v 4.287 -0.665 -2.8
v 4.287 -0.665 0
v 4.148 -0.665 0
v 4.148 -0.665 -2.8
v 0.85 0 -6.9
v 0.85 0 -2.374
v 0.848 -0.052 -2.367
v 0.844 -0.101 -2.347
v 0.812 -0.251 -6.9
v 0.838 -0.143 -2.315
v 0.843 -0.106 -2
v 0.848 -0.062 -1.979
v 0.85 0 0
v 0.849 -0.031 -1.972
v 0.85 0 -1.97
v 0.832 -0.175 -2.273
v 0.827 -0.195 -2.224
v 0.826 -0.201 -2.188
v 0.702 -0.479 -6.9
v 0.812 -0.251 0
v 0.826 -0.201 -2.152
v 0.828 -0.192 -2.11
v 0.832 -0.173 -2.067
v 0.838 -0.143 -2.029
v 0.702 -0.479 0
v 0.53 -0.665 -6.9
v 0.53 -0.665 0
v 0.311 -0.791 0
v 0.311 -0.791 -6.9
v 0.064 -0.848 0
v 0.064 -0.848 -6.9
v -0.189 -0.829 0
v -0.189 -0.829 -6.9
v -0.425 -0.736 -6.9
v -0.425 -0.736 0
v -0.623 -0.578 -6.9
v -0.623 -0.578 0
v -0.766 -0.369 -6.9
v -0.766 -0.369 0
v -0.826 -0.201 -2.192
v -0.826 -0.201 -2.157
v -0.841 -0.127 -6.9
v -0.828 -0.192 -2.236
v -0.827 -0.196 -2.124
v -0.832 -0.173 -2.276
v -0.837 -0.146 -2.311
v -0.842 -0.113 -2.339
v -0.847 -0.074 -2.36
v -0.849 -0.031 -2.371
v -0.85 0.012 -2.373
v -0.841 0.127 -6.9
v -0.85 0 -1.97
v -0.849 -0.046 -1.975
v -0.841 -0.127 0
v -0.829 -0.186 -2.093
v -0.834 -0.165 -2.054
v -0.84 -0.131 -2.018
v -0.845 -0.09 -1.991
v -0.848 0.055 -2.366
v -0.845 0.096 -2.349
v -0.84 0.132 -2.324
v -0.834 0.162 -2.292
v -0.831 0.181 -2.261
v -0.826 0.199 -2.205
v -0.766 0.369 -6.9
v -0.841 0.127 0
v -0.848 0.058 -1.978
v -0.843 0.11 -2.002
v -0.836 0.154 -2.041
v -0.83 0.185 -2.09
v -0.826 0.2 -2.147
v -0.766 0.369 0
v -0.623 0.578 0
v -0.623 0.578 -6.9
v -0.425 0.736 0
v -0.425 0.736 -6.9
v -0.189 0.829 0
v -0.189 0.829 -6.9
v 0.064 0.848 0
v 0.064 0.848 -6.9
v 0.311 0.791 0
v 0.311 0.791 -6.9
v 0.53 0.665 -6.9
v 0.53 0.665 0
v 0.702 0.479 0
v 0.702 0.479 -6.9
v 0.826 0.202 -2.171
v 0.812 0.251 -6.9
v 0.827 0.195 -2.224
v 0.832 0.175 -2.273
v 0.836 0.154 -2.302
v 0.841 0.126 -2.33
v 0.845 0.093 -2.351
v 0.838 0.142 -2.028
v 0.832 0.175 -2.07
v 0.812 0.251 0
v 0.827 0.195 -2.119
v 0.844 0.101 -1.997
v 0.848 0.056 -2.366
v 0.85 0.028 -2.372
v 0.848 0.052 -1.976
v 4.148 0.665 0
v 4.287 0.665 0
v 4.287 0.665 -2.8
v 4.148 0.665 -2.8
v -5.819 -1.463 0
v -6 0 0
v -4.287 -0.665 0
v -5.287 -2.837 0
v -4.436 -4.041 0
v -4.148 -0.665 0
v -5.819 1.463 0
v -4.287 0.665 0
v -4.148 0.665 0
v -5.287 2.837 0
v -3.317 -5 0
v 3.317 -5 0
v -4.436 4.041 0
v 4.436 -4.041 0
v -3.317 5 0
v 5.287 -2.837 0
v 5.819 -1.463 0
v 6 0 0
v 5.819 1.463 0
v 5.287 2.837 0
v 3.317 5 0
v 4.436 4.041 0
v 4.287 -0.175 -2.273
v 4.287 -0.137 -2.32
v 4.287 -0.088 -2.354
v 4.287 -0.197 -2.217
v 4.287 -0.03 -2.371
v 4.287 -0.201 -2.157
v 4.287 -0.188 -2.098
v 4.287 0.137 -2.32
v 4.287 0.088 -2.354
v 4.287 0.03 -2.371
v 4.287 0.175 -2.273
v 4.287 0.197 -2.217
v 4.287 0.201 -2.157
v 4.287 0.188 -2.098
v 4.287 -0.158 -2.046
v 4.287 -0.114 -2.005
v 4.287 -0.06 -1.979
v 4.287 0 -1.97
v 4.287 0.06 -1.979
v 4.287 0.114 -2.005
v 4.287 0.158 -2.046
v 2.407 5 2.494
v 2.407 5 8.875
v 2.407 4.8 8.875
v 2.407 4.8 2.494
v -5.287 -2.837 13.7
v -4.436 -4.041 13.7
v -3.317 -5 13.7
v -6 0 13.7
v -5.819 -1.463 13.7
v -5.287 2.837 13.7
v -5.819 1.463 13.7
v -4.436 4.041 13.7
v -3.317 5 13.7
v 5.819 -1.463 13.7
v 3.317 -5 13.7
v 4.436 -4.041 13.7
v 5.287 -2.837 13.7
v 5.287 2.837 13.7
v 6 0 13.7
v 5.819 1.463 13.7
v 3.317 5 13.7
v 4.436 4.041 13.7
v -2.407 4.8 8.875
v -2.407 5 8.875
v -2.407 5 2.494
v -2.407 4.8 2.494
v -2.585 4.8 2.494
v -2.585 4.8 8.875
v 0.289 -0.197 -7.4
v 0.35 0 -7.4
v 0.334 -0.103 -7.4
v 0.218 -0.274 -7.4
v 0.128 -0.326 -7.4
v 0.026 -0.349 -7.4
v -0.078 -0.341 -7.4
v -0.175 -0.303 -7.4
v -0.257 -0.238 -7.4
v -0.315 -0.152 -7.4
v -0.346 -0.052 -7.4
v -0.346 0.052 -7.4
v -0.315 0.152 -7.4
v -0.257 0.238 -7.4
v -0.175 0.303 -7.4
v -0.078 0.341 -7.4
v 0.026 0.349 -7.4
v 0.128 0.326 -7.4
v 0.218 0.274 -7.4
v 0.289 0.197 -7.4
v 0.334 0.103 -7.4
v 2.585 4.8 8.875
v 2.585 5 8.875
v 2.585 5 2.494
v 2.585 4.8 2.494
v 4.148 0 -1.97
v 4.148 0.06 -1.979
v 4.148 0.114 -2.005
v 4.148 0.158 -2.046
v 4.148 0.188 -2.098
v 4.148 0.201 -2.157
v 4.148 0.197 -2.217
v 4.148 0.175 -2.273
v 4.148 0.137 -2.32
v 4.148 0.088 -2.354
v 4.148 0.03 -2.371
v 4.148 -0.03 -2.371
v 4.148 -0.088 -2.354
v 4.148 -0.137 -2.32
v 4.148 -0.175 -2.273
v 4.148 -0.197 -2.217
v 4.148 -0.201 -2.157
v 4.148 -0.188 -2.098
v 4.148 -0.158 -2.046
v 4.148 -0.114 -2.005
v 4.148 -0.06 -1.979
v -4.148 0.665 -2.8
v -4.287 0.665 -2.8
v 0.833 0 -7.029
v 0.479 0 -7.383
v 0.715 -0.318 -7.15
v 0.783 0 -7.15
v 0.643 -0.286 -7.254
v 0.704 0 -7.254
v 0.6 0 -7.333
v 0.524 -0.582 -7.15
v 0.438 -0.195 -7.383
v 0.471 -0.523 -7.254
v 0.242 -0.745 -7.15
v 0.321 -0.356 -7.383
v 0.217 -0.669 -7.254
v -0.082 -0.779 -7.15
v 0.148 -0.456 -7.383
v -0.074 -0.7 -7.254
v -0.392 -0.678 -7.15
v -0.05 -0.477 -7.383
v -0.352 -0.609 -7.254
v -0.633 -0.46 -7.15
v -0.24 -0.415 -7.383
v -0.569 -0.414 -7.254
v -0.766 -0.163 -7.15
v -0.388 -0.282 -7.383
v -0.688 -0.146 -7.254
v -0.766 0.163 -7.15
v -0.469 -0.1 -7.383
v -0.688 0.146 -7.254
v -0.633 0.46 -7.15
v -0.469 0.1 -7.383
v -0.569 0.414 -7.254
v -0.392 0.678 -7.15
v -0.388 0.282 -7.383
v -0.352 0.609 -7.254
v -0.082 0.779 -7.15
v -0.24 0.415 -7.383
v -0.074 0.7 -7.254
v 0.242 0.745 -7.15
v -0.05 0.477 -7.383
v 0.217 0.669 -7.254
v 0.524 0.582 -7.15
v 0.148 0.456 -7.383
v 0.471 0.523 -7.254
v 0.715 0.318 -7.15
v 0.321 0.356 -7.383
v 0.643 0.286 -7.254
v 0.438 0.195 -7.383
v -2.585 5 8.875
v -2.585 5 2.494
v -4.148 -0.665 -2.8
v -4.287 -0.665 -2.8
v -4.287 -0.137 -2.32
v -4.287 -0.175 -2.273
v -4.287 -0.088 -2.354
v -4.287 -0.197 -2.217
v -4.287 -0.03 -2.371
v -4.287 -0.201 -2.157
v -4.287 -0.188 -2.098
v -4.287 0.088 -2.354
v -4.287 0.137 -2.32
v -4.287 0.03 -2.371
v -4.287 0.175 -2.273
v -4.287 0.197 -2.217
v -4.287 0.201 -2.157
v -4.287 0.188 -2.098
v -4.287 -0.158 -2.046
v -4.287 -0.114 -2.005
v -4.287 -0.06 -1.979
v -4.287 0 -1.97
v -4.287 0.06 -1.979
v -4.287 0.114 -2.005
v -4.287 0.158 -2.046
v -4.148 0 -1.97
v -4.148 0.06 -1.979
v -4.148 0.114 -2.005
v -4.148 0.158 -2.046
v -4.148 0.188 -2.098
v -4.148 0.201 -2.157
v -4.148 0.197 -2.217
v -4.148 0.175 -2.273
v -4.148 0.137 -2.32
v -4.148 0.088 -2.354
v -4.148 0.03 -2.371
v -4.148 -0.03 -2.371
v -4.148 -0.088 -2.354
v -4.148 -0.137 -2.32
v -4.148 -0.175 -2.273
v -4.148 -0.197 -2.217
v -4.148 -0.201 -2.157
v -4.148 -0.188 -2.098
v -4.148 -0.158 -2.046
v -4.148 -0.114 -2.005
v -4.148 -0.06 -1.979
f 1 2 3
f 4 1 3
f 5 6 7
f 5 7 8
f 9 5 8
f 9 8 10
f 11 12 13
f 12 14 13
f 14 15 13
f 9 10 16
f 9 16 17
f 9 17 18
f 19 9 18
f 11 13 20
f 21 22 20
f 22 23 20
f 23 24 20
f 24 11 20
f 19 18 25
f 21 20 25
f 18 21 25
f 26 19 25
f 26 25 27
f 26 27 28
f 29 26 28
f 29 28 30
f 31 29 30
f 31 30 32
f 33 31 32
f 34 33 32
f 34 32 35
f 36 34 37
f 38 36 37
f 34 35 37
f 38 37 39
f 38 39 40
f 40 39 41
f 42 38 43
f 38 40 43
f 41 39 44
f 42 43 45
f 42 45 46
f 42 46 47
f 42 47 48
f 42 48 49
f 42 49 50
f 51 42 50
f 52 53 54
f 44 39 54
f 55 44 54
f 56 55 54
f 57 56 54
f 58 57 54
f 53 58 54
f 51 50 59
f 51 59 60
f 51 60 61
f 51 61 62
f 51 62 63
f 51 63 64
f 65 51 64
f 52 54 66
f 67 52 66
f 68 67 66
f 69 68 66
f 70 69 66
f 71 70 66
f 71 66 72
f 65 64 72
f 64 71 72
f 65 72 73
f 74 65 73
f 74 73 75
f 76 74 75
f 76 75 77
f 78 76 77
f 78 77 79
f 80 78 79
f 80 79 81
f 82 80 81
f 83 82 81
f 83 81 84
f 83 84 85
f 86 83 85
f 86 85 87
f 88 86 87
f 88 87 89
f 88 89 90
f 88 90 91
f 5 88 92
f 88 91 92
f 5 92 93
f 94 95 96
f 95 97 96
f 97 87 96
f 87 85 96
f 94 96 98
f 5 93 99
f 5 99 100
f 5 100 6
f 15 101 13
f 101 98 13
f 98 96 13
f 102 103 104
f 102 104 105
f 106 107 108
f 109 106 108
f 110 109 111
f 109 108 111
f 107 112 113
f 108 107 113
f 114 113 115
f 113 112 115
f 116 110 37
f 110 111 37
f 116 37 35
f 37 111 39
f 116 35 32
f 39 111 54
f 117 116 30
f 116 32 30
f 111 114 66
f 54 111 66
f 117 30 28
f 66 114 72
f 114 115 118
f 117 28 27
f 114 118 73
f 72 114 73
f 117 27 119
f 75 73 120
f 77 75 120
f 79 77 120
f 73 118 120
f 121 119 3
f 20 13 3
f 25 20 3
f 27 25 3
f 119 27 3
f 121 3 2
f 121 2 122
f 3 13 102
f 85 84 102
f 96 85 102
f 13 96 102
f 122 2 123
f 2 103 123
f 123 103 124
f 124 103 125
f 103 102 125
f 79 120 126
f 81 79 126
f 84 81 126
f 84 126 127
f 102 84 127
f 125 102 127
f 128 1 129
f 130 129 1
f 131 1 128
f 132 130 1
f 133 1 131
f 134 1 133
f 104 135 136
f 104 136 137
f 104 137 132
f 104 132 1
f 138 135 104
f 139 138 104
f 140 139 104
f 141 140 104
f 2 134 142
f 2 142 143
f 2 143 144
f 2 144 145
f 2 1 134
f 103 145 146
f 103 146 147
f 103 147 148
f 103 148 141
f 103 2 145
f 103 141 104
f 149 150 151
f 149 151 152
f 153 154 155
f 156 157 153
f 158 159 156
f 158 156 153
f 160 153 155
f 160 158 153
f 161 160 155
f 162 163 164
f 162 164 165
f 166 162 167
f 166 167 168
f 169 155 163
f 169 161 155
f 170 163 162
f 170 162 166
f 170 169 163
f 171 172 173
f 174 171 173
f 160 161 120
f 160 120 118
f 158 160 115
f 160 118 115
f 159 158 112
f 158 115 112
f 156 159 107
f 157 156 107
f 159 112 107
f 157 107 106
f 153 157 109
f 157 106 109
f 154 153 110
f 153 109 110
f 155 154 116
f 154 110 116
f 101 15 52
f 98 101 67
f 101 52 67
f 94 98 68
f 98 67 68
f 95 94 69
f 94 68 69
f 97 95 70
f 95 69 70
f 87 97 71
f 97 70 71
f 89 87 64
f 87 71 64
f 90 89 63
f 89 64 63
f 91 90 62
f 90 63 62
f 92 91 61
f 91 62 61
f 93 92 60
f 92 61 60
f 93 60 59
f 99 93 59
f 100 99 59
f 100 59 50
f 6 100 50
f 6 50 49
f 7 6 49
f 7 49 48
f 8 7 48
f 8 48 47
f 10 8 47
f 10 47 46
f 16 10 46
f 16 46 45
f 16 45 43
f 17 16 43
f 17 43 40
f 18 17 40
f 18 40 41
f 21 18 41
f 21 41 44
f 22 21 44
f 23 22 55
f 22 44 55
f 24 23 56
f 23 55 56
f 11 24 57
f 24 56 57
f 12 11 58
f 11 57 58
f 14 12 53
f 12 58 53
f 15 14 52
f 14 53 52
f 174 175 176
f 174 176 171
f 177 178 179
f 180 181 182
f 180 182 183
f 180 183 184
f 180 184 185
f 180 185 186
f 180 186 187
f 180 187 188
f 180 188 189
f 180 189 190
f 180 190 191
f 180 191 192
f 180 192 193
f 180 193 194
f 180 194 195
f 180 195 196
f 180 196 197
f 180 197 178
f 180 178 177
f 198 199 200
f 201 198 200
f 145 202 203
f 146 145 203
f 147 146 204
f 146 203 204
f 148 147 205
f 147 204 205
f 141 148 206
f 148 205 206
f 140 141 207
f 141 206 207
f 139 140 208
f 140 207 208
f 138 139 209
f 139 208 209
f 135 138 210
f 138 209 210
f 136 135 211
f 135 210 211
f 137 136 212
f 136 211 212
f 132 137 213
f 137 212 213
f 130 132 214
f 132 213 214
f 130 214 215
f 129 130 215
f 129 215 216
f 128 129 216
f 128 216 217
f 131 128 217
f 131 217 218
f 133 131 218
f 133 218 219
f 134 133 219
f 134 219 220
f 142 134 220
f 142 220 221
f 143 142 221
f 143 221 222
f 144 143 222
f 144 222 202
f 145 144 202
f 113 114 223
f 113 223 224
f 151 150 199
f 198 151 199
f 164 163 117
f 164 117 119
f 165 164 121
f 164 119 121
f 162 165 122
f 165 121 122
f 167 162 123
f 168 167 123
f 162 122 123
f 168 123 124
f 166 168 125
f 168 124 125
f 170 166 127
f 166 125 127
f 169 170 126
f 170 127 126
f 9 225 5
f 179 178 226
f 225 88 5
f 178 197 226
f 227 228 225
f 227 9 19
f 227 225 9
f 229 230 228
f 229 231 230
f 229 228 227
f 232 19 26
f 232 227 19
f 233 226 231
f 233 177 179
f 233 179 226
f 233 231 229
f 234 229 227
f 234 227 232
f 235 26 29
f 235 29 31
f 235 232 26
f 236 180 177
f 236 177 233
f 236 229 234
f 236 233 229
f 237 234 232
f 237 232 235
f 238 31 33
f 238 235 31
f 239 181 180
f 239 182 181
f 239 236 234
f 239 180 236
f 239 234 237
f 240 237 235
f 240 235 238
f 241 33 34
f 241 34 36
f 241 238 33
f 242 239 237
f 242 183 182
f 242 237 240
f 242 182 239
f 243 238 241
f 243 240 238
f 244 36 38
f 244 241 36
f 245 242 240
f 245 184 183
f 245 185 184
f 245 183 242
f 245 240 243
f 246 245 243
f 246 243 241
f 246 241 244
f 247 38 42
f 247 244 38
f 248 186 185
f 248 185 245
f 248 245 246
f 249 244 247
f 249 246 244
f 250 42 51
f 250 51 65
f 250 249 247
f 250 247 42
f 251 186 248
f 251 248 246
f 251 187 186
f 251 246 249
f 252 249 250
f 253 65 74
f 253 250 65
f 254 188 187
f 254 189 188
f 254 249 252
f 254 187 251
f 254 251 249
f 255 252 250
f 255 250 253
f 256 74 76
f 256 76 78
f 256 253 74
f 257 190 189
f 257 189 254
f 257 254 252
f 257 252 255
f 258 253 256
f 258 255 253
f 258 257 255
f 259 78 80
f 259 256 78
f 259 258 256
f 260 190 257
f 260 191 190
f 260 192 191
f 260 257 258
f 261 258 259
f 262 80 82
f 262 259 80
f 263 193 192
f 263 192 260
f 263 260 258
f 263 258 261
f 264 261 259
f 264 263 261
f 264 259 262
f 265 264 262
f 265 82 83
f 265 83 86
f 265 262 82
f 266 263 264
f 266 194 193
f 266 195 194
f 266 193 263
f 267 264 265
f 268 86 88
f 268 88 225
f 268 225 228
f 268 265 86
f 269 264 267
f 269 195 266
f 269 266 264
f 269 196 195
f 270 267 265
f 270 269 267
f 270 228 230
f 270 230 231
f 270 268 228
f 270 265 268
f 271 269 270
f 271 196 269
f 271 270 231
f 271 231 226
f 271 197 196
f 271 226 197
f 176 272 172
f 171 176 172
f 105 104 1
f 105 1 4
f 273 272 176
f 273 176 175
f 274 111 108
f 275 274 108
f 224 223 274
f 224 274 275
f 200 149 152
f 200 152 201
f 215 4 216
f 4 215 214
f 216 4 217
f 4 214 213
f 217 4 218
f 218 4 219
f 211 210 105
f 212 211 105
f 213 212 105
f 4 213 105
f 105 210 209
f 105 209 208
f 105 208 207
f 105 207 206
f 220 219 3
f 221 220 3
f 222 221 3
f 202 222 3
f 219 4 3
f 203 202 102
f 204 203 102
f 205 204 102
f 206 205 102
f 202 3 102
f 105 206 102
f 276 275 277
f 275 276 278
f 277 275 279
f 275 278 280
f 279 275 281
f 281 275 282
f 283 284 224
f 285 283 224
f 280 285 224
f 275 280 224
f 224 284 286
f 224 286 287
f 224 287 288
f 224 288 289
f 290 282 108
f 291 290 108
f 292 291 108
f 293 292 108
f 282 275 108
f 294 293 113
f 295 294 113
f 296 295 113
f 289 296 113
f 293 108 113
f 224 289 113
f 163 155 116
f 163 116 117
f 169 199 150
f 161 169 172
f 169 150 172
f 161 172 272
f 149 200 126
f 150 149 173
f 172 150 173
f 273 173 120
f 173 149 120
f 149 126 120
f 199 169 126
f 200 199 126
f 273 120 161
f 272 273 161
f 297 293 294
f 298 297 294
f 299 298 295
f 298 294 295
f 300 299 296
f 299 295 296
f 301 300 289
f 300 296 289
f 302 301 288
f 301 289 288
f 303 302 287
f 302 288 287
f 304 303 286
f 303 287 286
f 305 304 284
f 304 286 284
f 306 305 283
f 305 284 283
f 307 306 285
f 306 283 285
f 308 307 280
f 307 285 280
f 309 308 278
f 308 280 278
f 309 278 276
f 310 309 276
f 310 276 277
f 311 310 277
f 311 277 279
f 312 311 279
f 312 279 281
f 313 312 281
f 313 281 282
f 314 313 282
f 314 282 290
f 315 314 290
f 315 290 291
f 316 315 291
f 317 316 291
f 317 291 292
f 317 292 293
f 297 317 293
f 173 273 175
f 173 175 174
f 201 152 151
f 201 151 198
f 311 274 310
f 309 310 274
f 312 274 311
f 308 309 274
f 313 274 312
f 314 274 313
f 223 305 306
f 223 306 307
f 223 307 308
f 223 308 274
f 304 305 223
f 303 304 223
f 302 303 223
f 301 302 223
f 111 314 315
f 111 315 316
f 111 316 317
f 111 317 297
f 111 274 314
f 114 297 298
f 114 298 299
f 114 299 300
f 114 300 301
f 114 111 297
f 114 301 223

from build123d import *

# Parameters (mm, degrees)
BOSS_EXTRUDE1_DEPTH = 13.7
SKETCH3_W           = 0.178571672
SKETCH3_H           = 6.380917094
CUT_EXTRUDE1_DEPTH  = 0.2
SKETCH4_R           = 0.85
BOSS_EXTRUDE3_DEPTH = 7.4
SKETCH5_W           = 0.138137893
SKETCH5_H           = 1.329179466
BOSS_EXTRUDE4_DEPTH = 2.8
SKETCH6_R           = 0.20198457
CUT_EXTRUDE2_DEPTH  = 9.6
REDONDEO1_R         = 0.5


with BuildPart() as part:
    # Sketch1 → Boss-Extrude1 (new body)
    with BuildSketch(Plane.XY):
        with BuildLine():
            Line((-3.31662479, -5), (3.31662479, -5))
            ThreePointArc((3.31662479, -5), (6, 0), (3.31662479, 5))
            Line((3.31662479, 5), (-3.31662479, 5))
            ThreePointArc((-3.31662479, 5), (-6, 0), (-3.31662479, -5))
        make_face()
    extrude(amount=BOSS_EXTRUDE1_DEPTH)

    # Sketch3 → Cut-Extrude1 (cut)
    with BuildSketch(Plane(origin=(0, 5, 0), x_dir=(1, 0, 0), z_dir=(0, 1, 0))):
        with Locations((-2.495957535, -5.684471075)):
            Rectangle(SKETCH3_W, SKETCH3_H)
        with Locations((2.495957535, -5.684471075)):
            Rectangle(SKETCH3_W, SKETCH3_H)
    extrude(amount=-CUT_EXTRUDE1_DEPTH, mode=Mode.SUBTRACT)

    # Sketch4 → Boss-Extrude3 (add)
    with BuildSketch(Plane(origin=(0, 0, 0), x_dir=(-1, 0, 0), z_dir=(0, 0, -1))):
        with Locations(Location((0, 0, 0), (0, 0, 180))):
            Circle(SKETCH4_R)
    extrude(amount=BOSS_EXTRUDE3_DEPTH)

    # Sketch5 → Boss-Extrude4 (add)
    with BuildSketch(Plane(origin=(0, 0, 0), x_dir=(-1, 0, 0), z_dir=(0, 0, -1))):
        with Locations((-4.217525365, 0)):
            Rectangle(SKETCH5_W, SKETCH5_H)
        with Locations((4.217525365, 0)):
            Rectangle(SKETCH5_W, SKETCH5_H)
    extrude(amount=BOSS_EXTRUDE4_DEPTH)

    # Sketch6 → Cut-Extrude2 (cut)
    with BuildSketch(Plane.ZY.offset(4.286594311)):
        with Locations((-2.171650698, 0)):
            Circle(SKETCH6_R)
    extrude(amount=-CUT_EXTRUDE2_DEPTH, mode=Mode.SUBTRACT)

    # Redondeo1
    redondeo1_edges = [part.edges().sort_by_distance(p)[0] for p in [
        (-0.85, 0, -7.4),
    ]]
    fillet(redondeo1_edges, radius=REDONDEO1_R)


solid = part.part
